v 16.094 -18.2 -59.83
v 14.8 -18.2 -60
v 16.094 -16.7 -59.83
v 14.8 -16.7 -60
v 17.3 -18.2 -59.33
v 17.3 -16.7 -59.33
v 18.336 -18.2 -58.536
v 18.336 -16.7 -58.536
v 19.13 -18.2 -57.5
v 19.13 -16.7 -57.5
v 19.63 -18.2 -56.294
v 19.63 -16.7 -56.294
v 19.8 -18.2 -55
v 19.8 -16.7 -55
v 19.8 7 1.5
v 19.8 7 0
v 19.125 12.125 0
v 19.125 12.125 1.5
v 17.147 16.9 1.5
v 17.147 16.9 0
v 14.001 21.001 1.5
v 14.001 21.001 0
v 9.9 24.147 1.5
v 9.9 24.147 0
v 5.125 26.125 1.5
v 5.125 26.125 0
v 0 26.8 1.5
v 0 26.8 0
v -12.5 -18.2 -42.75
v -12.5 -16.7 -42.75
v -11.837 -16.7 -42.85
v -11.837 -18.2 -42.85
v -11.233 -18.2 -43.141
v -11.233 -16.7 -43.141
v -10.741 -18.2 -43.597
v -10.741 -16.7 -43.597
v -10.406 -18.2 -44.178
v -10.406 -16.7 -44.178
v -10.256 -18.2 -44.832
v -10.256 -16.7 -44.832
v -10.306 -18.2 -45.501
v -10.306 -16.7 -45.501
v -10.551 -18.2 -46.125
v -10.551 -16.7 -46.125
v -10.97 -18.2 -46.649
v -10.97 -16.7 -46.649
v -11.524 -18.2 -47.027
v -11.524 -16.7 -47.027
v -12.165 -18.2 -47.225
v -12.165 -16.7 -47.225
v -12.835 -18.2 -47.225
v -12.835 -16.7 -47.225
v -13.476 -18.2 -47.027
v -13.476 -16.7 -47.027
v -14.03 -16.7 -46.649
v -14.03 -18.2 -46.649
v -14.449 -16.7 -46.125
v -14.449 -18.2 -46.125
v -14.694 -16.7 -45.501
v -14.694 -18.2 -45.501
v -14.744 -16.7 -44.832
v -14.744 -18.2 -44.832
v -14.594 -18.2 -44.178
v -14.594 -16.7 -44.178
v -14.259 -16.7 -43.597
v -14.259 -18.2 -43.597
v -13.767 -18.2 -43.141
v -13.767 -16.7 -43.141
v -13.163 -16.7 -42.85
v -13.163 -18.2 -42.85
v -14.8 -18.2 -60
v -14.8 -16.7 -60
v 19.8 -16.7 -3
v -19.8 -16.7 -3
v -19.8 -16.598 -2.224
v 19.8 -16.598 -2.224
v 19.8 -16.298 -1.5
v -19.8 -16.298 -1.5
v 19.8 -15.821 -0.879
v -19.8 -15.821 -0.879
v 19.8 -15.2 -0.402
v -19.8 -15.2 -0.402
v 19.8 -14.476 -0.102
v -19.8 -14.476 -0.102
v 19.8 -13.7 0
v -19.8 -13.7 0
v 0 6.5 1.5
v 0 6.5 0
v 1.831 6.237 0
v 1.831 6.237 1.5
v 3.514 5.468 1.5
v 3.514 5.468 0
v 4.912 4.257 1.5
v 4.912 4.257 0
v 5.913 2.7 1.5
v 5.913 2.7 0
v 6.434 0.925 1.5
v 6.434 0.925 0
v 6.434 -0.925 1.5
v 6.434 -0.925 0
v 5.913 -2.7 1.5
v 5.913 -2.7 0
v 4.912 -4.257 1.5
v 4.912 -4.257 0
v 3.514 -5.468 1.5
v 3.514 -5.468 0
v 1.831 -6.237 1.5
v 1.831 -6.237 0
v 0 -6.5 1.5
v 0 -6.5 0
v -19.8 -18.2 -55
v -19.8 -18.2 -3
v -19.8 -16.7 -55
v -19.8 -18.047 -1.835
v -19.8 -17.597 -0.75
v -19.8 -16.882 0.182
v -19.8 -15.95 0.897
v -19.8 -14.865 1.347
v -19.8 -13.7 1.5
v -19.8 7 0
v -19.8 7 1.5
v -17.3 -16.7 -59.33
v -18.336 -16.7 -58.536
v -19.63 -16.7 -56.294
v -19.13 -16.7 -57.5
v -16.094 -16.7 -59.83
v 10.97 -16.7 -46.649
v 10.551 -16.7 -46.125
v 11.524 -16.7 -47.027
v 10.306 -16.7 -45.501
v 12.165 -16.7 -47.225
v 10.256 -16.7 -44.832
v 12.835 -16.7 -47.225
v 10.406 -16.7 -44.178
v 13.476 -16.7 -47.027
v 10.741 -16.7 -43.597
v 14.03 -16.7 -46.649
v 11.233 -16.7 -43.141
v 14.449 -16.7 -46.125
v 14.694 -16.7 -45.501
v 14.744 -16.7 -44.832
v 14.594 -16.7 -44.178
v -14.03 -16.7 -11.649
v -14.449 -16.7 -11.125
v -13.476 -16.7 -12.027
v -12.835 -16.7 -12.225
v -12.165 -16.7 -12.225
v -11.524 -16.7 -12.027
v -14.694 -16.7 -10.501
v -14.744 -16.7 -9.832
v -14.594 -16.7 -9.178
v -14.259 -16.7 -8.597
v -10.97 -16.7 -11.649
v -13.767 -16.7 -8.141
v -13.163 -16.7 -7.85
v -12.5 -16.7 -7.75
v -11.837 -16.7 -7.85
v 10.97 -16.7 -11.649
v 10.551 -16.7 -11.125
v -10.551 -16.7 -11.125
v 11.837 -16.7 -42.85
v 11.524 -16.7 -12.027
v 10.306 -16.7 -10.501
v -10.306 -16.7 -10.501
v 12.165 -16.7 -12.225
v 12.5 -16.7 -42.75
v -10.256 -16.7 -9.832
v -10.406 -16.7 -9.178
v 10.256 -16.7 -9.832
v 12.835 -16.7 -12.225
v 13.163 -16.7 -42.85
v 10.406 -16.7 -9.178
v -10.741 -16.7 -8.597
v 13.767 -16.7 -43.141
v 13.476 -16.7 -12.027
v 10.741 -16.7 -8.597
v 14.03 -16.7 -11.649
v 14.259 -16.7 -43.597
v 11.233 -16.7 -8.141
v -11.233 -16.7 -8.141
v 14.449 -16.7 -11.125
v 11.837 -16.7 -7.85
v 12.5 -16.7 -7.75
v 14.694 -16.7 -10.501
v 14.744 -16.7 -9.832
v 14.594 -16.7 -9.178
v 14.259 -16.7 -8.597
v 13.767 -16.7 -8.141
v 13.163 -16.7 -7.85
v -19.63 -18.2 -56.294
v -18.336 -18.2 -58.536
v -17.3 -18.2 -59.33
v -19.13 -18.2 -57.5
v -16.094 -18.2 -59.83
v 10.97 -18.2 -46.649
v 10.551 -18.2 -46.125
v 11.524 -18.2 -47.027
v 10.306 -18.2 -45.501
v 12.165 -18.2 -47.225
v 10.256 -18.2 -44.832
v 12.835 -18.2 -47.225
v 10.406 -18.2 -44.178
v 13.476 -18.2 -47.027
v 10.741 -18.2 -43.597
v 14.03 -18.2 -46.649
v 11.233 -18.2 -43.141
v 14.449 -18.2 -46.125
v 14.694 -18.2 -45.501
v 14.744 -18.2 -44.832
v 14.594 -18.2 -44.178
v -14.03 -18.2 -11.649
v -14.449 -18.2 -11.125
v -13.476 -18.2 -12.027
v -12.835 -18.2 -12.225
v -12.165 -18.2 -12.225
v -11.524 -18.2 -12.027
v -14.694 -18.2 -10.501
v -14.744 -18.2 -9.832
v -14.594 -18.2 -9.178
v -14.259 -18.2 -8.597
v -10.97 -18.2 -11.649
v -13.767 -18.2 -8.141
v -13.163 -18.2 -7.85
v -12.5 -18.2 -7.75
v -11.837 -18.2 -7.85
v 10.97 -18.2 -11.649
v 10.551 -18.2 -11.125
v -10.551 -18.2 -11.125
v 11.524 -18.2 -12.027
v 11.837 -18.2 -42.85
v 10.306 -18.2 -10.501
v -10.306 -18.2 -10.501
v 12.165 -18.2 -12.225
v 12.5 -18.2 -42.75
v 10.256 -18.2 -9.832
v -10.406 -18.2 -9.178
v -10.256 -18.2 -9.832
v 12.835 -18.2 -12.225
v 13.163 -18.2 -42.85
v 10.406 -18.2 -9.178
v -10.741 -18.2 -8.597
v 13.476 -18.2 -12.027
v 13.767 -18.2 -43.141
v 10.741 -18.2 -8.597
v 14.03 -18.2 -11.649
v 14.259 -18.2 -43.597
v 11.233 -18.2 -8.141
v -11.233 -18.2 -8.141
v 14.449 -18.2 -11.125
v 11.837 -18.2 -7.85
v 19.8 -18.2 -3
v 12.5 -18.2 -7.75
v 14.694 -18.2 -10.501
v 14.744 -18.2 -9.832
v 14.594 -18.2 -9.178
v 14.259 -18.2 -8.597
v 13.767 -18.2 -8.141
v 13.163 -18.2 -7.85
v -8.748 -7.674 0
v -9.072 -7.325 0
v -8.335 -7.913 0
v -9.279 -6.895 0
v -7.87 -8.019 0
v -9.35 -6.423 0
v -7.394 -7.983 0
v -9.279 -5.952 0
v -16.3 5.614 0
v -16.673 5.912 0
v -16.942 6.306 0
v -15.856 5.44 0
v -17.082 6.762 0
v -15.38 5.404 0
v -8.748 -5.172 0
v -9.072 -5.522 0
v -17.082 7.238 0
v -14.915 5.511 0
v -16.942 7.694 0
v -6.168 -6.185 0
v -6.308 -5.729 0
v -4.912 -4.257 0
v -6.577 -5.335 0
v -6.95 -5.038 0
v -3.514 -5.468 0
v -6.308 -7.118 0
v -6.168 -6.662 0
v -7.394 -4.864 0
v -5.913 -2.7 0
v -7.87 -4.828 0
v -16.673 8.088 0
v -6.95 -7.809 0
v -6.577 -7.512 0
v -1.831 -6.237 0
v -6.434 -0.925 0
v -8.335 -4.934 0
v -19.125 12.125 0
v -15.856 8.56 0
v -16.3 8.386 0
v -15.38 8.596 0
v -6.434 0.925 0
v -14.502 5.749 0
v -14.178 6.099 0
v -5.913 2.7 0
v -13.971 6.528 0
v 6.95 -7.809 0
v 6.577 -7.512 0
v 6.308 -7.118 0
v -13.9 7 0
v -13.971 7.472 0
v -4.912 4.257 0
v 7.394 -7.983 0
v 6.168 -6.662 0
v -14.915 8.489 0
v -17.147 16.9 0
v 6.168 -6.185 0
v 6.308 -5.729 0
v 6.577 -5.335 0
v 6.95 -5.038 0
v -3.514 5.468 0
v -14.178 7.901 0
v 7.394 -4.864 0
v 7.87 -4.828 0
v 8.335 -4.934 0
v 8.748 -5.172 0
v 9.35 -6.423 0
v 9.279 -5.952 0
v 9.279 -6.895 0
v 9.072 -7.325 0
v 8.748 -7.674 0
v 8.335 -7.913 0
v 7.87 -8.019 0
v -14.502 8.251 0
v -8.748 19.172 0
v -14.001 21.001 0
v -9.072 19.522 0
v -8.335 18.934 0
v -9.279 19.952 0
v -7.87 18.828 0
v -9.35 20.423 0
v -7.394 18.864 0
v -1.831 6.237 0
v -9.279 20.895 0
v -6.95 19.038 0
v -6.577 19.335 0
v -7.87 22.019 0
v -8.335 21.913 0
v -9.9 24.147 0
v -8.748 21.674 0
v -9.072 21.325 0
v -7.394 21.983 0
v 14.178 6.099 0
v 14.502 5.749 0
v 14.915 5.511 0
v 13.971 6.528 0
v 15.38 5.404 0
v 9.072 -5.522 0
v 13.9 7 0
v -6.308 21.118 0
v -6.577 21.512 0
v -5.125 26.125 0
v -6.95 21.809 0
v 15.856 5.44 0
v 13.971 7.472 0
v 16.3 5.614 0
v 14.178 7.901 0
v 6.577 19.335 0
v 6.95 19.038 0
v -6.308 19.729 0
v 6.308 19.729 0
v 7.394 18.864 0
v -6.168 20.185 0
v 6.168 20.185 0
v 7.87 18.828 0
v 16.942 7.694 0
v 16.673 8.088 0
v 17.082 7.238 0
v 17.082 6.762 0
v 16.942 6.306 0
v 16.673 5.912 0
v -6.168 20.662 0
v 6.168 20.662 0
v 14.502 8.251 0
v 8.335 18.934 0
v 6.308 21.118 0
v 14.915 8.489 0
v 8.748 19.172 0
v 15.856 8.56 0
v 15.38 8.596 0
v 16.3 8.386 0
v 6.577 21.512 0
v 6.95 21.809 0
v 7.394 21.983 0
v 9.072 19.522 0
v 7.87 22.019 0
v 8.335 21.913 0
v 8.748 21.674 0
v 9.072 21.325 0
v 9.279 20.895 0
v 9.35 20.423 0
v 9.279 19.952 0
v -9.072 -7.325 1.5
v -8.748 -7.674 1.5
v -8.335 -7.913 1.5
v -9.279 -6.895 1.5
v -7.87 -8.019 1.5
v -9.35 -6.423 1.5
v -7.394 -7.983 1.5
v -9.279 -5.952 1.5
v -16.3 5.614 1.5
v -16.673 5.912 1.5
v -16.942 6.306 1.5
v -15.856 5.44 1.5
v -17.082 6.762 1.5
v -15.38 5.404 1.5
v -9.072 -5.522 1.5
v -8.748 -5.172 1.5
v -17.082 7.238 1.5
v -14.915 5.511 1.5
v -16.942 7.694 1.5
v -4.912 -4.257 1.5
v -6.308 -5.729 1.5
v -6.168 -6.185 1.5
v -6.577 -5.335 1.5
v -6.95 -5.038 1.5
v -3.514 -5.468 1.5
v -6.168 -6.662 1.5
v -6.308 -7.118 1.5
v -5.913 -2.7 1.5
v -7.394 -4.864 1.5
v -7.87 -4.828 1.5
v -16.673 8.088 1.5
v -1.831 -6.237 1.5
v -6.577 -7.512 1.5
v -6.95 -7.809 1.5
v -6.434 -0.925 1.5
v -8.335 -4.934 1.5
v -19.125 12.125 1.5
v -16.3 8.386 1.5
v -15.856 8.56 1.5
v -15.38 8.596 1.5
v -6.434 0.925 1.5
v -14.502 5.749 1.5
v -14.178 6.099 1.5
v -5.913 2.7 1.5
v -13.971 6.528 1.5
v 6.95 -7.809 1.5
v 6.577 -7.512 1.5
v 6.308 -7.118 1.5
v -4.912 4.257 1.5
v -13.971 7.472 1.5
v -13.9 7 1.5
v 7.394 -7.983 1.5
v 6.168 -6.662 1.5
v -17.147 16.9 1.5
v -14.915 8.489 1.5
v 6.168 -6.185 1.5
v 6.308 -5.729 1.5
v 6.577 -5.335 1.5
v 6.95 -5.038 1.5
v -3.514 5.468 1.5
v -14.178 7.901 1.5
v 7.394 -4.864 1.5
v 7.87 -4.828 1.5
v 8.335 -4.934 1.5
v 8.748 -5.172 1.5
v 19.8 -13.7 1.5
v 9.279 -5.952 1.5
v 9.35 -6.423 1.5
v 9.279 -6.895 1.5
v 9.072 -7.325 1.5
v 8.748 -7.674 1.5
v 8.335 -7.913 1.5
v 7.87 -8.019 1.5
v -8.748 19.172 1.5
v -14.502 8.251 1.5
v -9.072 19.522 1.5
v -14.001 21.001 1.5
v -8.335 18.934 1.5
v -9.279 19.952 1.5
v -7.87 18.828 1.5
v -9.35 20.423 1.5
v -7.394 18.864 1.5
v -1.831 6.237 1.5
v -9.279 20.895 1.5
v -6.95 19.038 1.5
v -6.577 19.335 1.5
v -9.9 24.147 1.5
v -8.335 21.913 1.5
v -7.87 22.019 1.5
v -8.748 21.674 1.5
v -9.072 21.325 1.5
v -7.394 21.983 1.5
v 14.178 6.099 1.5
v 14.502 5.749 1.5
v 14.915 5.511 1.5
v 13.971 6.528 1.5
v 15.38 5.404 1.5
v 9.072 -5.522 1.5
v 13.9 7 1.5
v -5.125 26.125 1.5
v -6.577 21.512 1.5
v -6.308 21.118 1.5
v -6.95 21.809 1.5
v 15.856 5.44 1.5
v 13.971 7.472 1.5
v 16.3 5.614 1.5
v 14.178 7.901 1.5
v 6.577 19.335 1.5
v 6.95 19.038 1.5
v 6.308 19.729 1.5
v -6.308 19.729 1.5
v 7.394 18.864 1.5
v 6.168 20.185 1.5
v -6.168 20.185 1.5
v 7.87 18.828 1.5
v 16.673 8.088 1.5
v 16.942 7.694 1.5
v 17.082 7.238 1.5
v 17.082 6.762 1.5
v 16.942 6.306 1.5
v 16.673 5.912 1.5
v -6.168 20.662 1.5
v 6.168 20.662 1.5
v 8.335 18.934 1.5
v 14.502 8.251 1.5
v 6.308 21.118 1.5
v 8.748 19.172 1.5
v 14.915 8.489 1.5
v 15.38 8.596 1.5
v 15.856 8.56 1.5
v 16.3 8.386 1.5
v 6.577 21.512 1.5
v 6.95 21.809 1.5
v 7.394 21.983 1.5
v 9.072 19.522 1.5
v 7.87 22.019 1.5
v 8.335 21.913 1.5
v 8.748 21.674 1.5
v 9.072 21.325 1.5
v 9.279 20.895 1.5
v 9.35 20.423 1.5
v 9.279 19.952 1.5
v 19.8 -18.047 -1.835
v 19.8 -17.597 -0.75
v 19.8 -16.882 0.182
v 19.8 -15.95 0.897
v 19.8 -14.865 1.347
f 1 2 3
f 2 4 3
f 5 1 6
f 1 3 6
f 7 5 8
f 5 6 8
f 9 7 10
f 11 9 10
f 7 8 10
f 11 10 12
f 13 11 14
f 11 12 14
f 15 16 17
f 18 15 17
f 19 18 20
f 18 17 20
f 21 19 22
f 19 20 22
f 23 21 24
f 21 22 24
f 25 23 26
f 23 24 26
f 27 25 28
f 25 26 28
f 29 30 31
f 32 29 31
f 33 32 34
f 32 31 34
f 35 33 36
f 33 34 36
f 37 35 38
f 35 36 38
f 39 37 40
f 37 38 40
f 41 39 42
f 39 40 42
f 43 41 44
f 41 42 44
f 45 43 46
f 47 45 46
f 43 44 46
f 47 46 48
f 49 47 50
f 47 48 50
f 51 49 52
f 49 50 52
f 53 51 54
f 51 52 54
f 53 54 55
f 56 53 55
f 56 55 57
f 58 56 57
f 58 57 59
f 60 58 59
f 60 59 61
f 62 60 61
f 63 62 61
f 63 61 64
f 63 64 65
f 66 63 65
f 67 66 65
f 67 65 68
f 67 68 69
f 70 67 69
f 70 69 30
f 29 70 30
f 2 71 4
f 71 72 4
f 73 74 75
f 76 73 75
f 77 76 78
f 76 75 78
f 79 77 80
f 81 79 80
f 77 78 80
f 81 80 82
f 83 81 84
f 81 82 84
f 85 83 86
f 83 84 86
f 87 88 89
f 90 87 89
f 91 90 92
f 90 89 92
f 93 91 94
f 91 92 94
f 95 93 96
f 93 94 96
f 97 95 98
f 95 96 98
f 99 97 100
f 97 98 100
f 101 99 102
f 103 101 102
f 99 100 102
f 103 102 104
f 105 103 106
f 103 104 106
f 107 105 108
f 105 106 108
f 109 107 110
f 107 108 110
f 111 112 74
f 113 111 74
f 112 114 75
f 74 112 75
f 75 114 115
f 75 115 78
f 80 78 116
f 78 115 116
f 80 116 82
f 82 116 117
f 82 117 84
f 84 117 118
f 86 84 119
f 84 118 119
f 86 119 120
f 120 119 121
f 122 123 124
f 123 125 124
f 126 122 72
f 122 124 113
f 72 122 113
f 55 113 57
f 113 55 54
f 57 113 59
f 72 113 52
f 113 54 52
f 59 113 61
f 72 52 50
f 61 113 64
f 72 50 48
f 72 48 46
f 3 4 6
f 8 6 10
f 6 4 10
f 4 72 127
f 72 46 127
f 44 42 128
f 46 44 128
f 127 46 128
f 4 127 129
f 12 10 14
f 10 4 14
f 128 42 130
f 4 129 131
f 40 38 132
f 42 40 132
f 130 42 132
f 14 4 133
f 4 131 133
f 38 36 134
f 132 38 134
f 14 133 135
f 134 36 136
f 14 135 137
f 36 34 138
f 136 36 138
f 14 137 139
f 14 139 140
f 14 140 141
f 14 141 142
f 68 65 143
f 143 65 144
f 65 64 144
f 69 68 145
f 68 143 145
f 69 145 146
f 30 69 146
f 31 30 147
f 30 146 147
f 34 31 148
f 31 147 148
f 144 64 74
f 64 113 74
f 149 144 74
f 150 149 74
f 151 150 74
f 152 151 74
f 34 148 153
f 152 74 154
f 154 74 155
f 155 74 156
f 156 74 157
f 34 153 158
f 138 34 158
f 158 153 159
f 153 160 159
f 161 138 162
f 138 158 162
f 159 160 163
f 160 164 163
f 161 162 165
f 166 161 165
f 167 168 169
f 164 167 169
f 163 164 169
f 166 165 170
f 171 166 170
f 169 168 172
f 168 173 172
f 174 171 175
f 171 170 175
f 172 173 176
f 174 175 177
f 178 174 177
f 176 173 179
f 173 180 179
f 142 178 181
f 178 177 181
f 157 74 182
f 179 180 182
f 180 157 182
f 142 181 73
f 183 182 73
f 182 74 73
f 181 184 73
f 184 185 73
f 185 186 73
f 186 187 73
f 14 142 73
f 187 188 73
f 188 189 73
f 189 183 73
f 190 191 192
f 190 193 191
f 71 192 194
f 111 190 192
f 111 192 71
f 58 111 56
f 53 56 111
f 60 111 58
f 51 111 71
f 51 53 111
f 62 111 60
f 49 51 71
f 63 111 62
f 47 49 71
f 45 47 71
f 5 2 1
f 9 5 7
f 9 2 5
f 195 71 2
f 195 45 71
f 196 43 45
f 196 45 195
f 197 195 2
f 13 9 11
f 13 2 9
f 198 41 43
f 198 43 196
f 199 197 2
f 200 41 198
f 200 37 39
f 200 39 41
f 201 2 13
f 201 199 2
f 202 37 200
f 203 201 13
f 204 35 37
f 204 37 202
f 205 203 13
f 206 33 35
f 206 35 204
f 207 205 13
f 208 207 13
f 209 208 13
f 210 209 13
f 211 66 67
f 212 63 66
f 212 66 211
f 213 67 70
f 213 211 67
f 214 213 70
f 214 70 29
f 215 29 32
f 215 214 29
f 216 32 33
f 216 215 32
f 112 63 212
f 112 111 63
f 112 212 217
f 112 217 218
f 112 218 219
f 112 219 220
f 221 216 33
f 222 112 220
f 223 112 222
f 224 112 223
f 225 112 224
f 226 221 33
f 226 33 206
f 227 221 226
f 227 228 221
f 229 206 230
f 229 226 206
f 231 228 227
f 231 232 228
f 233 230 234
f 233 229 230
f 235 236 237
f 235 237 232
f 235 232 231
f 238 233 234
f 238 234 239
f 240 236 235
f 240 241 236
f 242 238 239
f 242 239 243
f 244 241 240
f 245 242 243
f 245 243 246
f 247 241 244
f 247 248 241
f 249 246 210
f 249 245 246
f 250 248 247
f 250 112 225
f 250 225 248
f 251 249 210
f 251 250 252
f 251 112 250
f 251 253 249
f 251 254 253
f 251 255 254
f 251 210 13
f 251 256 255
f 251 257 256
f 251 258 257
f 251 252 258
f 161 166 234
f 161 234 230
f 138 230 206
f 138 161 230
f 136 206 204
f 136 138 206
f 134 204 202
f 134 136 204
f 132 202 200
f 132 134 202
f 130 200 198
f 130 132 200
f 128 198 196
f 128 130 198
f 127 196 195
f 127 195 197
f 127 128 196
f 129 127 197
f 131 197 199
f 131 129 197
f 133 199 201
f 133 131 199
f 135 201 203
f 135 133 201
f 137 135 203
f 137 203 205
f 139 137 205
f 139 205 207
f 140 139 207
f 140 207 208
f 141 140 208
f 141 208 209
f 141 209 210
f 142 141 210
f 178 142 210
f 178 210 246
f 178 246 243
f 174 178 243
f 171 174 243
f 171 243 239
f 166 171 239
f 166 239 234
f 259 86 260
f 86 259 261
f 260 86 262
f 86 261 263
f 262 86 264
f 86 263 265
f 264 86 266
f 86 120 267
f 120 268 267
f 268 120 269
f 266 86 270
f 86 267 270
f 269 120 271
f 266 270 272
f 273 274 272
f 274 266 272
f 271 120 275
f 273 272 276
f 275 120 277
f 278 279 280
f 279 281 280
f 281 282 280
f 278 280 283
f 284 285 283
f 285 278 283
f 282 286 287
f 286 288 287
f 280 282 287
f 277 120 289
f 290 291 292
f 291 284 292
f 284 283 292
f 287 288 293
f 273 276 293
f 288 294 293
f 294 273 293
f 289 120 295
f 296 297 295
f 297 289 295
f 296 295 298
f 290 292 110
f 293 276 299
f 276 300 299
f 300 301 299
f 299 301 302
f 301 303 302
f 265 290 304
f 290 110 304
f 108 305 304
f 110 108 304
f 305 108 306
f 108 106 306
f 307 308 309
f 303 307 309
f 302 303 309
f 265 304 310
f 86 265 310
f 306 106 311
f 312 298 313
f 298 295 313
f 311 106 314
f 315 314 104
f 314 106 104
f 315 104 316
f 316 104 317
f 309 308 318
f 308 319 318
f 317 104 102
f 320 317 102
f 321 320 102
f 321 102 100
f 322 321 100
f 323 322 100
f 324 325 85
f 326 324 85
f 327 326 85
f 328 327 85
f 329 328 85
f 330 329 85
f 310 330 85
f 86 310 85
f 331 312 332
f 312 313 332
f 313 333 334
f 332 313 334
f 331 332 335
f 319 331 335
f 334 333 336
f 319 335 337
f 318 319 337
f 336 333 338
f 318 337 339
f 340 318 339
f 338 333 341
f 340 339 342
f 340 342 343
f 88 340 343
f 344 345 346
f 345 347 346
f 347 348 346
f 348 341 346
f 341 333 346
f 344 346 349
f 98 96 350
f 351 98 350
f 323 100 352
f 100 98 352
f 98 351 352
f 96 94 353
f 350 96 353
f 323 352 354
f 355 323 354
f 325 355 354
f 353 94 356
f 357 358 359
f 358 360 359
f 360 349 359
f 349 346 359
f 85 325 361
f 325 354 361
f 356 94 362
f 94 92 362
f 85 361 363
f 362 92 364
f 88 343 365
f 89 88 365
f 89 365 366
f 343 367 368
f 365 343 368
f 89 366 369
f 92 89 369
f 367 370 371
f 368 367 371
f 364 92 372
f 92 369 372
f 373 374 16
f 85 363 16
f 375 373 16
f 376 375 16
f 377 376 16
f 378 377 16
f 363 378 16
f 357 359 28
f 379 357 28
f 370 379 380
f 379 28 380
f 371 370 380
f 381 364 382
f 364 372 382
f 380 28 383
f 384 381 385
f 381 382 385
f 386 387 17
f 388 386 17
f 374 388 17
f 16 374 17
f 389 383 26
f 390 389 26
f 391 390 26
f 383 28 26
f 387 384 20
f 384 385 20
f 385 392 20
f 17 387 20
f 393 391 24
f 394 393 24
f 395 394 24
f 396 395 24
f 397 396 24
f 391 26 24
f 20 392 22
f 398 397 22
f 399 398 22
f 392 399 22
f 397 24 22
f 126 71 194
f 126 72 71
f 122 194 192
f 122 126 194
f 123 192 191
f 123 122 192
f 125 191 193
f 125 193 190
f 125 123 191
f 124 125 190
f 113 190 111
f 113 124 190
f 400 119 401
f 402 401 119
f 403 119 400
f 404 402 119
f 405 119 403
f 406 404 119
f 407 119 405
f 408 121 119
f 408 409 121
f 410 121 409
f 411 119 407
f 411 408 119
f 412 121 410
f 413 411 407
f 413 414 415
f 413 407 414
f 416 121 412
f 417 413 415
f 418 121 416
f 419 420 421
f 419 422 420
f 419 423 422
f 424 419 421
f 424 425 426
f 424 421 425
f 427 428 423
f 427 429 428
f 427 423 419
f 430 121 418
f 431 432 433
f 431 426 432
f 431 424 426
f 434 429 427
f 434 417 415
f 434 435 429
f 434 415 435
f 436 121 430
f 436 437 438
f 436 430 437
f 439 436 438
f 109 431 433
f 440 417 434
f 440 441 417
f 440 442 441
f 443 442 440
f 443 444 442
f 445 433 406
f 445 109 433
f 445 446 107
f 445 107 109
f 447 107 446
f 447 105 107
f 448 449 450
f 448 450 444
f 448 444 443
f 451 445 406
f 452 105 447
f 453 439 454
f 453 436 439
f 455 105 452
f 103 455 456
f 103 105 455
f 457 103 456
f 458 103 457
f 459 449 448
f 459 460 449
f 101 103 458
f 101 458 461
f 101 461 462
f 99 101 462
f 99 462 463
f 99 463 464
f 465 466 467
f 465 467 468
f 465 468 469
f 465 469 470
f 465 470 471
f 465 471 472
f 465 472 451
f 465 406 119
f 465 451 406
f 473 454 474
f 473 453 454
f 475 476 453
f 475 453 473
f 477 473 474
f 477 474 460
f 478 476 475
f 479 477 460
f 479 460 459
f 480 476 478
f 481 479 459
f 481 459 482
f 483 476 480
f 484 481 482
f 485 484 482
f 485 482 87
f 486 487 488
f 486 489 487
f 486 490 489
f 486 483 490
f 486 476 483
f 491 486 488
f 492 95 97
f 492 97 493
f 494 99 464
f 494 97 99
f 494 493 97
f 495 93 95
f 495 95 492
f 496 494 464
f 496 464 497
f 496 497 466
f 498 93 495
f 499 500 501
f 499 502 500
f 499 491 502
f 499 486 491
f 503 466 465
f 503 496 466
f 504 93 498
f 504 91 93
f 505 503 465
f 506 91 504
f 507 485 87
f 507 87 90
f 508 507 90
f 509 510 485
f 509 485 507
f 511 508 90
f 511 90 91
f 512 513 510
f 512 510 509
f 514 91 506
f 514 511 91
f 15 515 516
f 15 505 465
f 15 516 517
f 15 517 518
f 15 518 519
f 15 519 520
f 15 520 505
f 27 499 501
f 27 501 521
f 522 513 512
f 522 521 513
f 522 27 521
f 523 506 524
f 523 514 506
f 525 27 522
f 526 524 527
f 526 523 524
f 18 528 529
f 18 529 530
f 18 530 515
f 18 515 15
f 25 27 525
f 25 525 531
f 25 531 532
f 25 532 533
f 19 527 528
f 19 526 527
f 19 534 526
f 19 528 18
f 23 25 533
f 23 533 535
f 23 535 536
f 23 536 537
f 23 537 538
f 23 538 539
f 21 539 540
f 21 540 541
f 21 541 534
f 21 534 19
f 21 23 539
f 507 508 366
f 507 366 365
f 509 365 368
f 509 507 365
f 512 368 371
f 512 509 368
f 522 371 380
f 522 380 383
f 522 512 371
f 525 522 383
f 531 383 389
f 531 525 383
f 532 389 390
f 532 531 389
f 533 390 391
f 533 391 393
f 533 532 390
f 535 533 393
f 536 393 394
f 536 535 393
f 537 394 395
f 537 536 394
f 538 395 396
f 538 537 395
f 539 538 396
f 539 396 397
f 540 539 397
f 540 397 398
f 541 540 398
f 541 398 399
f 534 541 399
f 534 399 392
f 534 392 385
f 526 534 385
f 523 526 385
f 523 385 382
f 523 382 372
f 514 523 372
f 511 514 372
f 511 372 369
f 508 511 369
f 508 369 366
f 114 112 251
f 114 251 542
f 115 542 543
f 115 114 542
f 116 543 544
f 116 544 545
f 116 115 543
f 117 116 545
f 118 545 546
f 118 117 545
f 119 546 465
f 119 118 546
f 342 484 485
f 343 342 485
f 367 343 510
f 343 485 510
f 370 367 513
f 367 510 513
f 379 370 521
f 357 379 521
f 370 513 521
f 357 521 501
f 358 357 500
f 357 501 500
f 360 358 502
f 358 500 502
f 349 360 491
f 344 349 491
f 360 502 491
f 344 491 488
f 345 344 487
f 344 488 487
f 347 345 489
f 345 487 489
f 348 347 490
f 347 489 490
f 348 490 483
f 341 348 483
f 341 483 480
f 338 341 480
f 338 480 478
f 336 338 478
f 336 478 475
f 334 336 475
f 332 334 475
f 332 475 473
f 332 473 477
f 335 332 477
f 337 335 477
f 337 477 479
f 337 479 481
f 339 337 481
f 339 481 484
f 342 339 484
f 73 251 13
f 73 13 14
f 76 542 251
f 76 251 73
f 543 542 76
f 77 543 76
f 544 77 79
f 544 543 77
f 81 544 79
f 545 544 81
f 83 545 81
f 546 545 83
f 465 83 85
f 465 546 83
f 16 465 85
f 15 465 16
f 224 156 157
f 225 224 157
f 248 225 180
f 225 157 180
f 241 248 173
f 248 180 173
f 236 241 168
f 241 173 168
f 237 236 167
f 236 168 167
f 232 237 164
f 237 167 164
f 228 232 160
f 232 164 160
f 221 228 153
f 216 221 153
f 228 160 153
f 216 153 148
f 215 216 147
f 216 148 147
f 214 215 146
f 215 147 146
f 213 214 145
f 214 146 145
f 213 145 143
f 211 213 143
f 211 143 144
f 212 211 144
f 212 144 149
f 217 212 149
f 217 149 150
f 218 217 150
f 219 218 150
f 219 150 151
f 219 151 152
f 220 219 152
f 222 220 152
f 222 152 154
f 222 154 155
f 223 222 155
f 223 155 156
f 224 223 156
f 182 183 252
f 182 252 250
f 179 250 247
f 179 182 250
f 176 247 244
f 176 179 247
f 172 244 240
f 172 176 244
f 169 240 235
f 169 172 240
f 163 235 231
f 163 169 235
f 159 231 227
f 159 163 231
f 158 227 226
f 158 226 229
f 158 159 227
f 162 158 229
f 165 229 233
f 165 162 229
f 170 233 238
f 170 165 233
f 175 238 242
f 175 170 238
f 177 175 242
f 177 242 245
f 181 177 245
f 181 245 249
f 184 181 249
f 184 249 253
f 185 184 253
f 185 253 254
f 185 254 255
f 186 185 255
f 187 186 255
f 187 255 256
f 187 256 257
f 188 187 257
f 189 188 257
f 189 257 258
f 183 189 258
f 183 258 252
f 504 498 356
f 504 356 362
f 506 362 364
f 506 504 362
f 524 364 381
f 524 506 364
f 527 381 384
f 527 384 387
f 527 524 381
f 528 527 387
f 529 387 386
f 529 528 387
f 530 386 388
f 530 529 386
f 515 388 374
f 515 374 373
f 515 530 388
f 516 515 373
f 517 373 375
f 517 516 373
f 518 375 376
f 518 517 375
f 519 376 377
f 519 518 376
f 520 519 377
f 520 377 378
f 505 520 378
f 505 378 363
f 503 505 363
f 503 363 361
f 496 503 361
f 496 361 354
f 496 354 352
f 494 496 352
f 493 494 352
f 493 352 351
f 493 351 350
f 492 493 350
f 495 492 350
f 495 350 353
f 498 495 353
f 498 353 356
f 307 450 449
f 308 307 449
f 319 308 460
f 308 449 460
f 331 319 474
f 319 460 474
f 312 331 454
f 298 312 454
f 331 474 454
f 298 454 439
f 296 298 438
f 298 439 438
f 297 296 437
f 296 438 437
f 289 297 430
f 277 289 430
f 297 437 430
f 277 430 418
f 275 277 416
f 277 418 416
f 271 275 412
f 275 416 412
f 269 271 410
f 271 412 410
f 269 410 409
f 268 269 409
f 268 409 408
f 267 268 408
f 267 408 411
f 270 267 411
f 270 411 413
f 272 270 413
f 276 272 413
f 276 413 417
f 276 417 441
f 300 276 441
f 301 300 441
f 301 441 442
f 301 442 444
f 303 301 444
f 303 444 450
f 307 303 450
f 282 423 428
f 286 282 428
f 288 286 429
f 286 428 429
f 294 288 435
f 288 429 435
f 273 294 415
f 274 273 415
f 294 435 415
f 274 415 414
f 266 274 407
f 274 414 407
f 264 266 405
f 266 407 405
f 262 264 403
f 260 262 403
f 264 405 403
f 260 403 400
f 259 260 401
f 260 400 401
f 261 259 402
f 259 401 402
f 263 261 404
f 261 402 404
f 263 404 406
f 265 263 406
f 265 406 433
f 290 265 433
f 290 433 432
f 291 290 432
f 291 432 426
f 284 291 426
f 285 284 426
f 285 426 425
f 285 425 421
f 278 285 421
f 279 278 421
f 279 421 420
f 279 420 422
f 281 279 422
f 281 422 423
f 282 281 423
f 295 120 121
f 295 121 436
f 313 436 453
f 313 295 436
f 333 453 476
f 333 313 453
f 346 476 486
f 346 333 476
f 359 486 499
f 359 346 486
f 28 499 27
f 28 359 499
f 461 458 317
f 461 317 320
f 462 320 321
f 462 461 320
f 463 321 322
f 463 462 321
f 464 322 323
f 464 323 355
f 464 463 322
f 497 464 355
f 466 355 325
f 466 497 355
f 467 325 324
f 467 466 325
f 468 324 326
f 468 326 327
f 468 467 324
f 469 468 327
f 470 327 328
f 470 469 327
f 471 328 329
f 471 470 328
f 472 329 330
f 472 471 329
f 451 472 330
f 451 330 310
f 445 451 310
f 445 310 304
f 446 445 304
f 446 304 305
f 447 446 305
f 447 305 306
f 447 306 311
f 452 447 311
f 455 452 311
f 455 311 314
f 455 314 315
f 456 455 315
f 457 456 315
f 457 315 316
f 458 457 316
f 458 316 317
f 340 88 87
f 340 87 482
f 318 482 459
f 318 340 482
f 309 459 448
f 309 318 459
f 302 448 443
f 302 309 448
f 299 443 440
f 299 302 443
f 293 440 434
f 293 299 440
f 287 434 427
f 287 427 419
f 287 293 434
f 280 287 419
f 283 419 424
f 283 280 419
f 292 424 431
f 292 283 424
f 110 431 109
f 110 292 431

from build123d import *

# Parameters (mm, degrees)
BOSS_EXTRUDE1_DEPTH                     = 1.5
SKETCH2_R                               = 1.6
MOT_MNT_SCREW_HOLE_DEPTH                = 34.354609876
MOT_MNT_SCREW_HOLES_COUNT               = 2
MOT_MNT_SCREW_HOLES_ANGLE               = 60
MOT_MNT_SCREW_HOLES_THE_OTHER_WAY_COUNT = 2
MOT_MNT_SCREW_HOLES_THE_OTHER_WAY_ANGLE = 60
SKETCH3_W                               = 19.8
SKETCH3_H                               = 1.5
BASE_FLANGE_DEPTH                       = 60
SKETCH4_R                               = 2.25
BASE_MNT_SCREW_HOLES_DEPTH              = 77.709125924
FILLET1_R                               = 5
CONVERT_SOLID2_START                    = -19.8
CONVERT_SOLID2_DEPTH                    = 39.6
CONVERT_SOLID2_2_DEPTH                  = 39.6


# Read off the part's stored shape, not the designer's step: Convert-Solid2
with BuildPart() as part:
    # Sketch1 → Boss-Extrude1 (new body)
    with BuildSketch(Plane.XY):
        with BuildLine():
            Line((0, 26.8), (0, 6.5))
            ThreePointArc((0, 6.5), (-6.5, 0), (0, -6.5))
            Line((0, -6.5), (0, -18.2))
            Line((0, -18.2), (-19.8, -18.2))
            Line((-19.8, -18.2), (-19.8, 7))
            ThreePointArc((-19.8, 7), (-14.000714267, 21.000714267), (0, 26.8))
        make_face()
    extrude(amount=BOSS_EXTRUDE1_DEPTH)

    # Sketch2 → mot mnt screw hole (cut, through all)
    with BuildSketch(Plane.XY.offset(1.5)):
        with Locations((-15.5, 7)):
            Circle(SKETCH2_R)
    mot_mnt_screw_hole = extrude(amount=-MOT_MNT_SCREW_HOLE_DEPTH, mode=Mode.SUBTRACT)

    # mot mnt screw holes: mot mnt screw hole ×2 about axis
    mot_mnt_screw_holes_axis = Axis((0, 7, 1.5), (0, 0, -1))
    for i in range(1, MOT_MNT_SCREW_HOLES_COUNT):
        add(mot_mnt_screw_hole.rotate(mot_mnt_screw_holes_axis, i * MOT_MNT_SCREW_HOLES_ANGLE / (MOT_MNT_SCREW_HOLES_COUNT - 1)), mode=Mode.SUBTRACT)

    # mot mnt screw holes the other way: mot mnt screw hole ×2 about axis
    mot_mnt_screw_holes_the_other_way_axis = Axis((0, 7, 1.5), (0, 0, 1))
    for i in range(1, MOT_MNT_SCREW_HOLES_THE_OTHER_WAY_COUNT):
        add(mot_mnt_screw_hole.rotate(mot_mnt_screw_holes_the_other_way_axis, i * MOT_MNT_SCREW_HOLES_THE_OTHER_WAY_ANGLE / (MOT_MNT_SCREW_HOLES_THE_OTHER_WAY_COUNT - 1)), mode=Mode.SUBTRACT)

    # Sketch3 → base flange (add)
    with BuildSketch(Plane(origin=(0, 0, 0), x_dir=(-1, 0, 0), z_dir=(0, 0, -1))):
        with Locations((9.9, -17.45)):
            Rectangle(SKETCH3_W, SKETCH3_H)
    extrude(amount=BASE_FLANGE_DEPTH)

    # Sketch4 → base mnt screw holes (cut, through all)
    with BuildSketch(Plane(origin=(0, -16.7, 0), x_dir=(1, 0, 0), z_dir=(0, 1, 0))):
        with Locations(Location((-12.5, 10, 0), (0, 0, 270))):
            Circle(SKETCH4_R)
        with Locations(Location((-12.5, 45, 0), (0, 0, 270))):
            Circle(SKETCH4_R)
    extrude(amount=-BASE_MNT_SCREW_HOLES_DEPTH, mode=Mode.SUBTRACT)

    # Fillet1
    fillet1_edges = [part.edges().sort_by_distance(p)[0] for p in [
        (-19.8, -17.45, -60),
    ]]
    fillet(fillet1_edges, radius=FILLET1_R)

    # Mirror1: part across plane


with BuildPart() as part_1:
    add(part.part)
    add(part.part.mirror(Plane(origin=(0, 0, 0), x_dir=(0, 0, 1), z_dir=(1, 0, 0))))

    # Convert-Solid2 outline → Convert-Solid2 (cut)
    with BuildSketch(Plane.YZ.offset(CONVERT_SOLID2_START)):
        with BuildLine():
            ThreePointArc((-18.2, -3), (-16.881980515, 0.181980515), (-13.7, 1.5))
            Line((-13.7, 1.5), (-18.2, 1.5))
            Line((-18.2, 1.5), (-18.2, -3))
        make_face()
    extrude(amount=CONVERT_SOLID2_DEPTH, mode=Mode.SUBTRACT)

    # Convert-Solid2 2 outline → Convert-Solid2 2 (add)
    with BuildSketch(Plane.YZ.offset(CONVERT_SOLID2_START)):
        with BuildLine():
            ThreePointArc((-16.7, -3), (-15.821320344, -0.878679656), (-13.7, 0))
            Line((-13.7, 0), (-16.7, 0))
            Line((-16.7, 0), (-16.7, -3))
        make_face()
    extrude(amount=CONVERT_SOLID2_2_DEPTH)


solid = part_1.part
